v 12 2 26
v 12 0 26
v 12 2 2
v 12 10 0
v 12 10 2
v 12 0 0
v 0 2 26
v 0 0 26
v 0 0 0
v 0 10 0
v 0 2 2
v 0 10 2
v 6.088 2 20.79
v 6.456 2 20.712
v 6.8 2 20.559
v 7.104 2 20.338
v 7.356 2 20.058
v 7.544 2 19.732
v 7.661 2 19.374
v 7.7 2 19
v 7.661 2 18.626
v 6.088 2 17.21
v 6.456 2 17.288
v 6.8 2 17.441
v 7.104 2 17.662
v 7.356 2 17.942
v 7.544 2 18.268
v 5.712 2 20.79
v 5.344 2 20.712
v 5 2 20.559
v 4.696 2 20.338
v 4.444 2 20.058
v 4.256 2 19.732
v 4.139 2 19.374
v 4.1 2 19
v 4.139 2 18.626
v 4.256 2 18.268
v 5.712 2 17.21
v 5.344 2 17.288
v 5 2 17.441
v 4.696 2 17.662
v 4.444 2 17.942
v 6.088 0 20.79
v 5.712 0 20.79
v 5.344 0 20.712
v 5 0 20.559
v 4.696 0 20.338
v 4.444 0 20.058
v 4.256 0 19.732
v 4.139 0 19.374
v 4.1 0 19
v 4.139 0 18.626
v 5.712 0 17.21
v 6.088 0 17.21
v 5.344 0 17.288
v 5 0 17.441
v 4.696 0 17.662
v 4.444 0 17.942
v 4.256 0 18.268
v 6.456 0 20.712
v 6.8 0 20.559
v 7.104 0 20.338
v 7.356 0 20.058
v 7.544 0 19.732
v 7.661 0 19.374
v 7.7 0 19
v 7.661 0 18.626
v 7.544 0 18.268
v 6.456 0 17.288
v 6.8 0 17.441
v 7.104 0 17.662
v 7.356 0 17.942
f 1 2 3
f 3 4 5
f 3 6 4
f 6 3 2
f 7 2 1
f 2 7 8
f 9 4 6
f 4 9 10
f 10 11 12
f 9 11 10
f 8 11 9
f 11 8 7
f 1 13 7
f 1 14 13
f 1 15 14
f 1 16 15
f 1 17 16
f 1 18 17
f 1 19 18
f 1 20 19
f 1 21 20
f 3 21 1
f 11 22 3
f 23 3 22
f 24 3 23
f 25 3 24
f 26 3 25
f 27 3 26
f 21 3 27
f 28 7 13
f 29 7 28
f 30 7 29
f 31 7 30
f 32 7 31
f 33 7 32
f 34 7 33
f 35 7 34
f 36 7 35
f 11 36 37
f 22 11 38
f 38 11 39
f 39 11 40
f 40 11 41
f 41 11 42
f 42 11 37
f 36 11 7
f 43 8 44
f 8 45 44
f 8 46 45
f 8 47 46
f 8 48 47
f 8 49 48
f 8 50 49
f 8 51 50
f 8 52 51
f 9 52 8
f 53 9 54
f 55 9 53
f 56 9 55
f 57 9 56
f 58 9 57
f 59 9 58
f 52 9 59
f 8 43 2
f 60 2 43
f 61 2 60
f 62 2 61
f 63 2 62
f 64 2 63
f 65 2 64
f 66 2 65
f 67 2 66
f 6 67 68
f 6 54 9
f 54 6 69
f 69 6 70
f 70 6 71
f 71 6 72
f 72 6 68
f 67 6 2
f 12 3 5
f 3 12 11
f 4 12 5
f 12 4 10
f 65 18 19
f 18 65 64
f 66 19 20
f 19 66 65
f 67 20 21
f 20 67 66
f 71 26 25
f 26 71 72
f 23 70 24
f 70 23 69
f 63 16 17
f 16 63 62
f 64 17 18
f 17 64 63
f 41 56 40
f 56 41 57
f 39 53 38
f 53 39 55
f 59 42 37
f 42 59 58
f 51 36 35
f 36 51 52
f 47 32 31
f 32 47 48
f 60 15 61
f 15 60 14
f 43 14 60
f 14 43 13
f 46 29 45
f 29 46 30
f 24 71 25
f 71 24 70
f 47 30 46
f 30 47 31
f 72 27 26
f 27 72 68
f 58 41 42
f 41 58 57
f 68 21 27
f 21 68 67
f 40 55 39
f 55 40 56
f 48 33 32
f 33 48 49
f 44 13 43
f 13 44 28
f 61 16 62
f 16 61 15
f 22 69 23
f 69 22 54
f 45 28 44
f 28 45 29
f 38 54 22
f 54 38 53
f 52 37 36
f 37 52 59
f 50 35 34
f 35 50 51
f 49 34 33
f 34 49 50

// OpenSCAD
$fn = 30;

wall = 2;

difference() {
  union() {
    cube([12, wall, 26]);
    cube([12, 10, wall]);
  }
  translate([5+0.9, 0, 19]) {
    rotate([90, 0, 0]) {
      cylinder(d=3.6, h=20, center=true);
    }
  }
}
